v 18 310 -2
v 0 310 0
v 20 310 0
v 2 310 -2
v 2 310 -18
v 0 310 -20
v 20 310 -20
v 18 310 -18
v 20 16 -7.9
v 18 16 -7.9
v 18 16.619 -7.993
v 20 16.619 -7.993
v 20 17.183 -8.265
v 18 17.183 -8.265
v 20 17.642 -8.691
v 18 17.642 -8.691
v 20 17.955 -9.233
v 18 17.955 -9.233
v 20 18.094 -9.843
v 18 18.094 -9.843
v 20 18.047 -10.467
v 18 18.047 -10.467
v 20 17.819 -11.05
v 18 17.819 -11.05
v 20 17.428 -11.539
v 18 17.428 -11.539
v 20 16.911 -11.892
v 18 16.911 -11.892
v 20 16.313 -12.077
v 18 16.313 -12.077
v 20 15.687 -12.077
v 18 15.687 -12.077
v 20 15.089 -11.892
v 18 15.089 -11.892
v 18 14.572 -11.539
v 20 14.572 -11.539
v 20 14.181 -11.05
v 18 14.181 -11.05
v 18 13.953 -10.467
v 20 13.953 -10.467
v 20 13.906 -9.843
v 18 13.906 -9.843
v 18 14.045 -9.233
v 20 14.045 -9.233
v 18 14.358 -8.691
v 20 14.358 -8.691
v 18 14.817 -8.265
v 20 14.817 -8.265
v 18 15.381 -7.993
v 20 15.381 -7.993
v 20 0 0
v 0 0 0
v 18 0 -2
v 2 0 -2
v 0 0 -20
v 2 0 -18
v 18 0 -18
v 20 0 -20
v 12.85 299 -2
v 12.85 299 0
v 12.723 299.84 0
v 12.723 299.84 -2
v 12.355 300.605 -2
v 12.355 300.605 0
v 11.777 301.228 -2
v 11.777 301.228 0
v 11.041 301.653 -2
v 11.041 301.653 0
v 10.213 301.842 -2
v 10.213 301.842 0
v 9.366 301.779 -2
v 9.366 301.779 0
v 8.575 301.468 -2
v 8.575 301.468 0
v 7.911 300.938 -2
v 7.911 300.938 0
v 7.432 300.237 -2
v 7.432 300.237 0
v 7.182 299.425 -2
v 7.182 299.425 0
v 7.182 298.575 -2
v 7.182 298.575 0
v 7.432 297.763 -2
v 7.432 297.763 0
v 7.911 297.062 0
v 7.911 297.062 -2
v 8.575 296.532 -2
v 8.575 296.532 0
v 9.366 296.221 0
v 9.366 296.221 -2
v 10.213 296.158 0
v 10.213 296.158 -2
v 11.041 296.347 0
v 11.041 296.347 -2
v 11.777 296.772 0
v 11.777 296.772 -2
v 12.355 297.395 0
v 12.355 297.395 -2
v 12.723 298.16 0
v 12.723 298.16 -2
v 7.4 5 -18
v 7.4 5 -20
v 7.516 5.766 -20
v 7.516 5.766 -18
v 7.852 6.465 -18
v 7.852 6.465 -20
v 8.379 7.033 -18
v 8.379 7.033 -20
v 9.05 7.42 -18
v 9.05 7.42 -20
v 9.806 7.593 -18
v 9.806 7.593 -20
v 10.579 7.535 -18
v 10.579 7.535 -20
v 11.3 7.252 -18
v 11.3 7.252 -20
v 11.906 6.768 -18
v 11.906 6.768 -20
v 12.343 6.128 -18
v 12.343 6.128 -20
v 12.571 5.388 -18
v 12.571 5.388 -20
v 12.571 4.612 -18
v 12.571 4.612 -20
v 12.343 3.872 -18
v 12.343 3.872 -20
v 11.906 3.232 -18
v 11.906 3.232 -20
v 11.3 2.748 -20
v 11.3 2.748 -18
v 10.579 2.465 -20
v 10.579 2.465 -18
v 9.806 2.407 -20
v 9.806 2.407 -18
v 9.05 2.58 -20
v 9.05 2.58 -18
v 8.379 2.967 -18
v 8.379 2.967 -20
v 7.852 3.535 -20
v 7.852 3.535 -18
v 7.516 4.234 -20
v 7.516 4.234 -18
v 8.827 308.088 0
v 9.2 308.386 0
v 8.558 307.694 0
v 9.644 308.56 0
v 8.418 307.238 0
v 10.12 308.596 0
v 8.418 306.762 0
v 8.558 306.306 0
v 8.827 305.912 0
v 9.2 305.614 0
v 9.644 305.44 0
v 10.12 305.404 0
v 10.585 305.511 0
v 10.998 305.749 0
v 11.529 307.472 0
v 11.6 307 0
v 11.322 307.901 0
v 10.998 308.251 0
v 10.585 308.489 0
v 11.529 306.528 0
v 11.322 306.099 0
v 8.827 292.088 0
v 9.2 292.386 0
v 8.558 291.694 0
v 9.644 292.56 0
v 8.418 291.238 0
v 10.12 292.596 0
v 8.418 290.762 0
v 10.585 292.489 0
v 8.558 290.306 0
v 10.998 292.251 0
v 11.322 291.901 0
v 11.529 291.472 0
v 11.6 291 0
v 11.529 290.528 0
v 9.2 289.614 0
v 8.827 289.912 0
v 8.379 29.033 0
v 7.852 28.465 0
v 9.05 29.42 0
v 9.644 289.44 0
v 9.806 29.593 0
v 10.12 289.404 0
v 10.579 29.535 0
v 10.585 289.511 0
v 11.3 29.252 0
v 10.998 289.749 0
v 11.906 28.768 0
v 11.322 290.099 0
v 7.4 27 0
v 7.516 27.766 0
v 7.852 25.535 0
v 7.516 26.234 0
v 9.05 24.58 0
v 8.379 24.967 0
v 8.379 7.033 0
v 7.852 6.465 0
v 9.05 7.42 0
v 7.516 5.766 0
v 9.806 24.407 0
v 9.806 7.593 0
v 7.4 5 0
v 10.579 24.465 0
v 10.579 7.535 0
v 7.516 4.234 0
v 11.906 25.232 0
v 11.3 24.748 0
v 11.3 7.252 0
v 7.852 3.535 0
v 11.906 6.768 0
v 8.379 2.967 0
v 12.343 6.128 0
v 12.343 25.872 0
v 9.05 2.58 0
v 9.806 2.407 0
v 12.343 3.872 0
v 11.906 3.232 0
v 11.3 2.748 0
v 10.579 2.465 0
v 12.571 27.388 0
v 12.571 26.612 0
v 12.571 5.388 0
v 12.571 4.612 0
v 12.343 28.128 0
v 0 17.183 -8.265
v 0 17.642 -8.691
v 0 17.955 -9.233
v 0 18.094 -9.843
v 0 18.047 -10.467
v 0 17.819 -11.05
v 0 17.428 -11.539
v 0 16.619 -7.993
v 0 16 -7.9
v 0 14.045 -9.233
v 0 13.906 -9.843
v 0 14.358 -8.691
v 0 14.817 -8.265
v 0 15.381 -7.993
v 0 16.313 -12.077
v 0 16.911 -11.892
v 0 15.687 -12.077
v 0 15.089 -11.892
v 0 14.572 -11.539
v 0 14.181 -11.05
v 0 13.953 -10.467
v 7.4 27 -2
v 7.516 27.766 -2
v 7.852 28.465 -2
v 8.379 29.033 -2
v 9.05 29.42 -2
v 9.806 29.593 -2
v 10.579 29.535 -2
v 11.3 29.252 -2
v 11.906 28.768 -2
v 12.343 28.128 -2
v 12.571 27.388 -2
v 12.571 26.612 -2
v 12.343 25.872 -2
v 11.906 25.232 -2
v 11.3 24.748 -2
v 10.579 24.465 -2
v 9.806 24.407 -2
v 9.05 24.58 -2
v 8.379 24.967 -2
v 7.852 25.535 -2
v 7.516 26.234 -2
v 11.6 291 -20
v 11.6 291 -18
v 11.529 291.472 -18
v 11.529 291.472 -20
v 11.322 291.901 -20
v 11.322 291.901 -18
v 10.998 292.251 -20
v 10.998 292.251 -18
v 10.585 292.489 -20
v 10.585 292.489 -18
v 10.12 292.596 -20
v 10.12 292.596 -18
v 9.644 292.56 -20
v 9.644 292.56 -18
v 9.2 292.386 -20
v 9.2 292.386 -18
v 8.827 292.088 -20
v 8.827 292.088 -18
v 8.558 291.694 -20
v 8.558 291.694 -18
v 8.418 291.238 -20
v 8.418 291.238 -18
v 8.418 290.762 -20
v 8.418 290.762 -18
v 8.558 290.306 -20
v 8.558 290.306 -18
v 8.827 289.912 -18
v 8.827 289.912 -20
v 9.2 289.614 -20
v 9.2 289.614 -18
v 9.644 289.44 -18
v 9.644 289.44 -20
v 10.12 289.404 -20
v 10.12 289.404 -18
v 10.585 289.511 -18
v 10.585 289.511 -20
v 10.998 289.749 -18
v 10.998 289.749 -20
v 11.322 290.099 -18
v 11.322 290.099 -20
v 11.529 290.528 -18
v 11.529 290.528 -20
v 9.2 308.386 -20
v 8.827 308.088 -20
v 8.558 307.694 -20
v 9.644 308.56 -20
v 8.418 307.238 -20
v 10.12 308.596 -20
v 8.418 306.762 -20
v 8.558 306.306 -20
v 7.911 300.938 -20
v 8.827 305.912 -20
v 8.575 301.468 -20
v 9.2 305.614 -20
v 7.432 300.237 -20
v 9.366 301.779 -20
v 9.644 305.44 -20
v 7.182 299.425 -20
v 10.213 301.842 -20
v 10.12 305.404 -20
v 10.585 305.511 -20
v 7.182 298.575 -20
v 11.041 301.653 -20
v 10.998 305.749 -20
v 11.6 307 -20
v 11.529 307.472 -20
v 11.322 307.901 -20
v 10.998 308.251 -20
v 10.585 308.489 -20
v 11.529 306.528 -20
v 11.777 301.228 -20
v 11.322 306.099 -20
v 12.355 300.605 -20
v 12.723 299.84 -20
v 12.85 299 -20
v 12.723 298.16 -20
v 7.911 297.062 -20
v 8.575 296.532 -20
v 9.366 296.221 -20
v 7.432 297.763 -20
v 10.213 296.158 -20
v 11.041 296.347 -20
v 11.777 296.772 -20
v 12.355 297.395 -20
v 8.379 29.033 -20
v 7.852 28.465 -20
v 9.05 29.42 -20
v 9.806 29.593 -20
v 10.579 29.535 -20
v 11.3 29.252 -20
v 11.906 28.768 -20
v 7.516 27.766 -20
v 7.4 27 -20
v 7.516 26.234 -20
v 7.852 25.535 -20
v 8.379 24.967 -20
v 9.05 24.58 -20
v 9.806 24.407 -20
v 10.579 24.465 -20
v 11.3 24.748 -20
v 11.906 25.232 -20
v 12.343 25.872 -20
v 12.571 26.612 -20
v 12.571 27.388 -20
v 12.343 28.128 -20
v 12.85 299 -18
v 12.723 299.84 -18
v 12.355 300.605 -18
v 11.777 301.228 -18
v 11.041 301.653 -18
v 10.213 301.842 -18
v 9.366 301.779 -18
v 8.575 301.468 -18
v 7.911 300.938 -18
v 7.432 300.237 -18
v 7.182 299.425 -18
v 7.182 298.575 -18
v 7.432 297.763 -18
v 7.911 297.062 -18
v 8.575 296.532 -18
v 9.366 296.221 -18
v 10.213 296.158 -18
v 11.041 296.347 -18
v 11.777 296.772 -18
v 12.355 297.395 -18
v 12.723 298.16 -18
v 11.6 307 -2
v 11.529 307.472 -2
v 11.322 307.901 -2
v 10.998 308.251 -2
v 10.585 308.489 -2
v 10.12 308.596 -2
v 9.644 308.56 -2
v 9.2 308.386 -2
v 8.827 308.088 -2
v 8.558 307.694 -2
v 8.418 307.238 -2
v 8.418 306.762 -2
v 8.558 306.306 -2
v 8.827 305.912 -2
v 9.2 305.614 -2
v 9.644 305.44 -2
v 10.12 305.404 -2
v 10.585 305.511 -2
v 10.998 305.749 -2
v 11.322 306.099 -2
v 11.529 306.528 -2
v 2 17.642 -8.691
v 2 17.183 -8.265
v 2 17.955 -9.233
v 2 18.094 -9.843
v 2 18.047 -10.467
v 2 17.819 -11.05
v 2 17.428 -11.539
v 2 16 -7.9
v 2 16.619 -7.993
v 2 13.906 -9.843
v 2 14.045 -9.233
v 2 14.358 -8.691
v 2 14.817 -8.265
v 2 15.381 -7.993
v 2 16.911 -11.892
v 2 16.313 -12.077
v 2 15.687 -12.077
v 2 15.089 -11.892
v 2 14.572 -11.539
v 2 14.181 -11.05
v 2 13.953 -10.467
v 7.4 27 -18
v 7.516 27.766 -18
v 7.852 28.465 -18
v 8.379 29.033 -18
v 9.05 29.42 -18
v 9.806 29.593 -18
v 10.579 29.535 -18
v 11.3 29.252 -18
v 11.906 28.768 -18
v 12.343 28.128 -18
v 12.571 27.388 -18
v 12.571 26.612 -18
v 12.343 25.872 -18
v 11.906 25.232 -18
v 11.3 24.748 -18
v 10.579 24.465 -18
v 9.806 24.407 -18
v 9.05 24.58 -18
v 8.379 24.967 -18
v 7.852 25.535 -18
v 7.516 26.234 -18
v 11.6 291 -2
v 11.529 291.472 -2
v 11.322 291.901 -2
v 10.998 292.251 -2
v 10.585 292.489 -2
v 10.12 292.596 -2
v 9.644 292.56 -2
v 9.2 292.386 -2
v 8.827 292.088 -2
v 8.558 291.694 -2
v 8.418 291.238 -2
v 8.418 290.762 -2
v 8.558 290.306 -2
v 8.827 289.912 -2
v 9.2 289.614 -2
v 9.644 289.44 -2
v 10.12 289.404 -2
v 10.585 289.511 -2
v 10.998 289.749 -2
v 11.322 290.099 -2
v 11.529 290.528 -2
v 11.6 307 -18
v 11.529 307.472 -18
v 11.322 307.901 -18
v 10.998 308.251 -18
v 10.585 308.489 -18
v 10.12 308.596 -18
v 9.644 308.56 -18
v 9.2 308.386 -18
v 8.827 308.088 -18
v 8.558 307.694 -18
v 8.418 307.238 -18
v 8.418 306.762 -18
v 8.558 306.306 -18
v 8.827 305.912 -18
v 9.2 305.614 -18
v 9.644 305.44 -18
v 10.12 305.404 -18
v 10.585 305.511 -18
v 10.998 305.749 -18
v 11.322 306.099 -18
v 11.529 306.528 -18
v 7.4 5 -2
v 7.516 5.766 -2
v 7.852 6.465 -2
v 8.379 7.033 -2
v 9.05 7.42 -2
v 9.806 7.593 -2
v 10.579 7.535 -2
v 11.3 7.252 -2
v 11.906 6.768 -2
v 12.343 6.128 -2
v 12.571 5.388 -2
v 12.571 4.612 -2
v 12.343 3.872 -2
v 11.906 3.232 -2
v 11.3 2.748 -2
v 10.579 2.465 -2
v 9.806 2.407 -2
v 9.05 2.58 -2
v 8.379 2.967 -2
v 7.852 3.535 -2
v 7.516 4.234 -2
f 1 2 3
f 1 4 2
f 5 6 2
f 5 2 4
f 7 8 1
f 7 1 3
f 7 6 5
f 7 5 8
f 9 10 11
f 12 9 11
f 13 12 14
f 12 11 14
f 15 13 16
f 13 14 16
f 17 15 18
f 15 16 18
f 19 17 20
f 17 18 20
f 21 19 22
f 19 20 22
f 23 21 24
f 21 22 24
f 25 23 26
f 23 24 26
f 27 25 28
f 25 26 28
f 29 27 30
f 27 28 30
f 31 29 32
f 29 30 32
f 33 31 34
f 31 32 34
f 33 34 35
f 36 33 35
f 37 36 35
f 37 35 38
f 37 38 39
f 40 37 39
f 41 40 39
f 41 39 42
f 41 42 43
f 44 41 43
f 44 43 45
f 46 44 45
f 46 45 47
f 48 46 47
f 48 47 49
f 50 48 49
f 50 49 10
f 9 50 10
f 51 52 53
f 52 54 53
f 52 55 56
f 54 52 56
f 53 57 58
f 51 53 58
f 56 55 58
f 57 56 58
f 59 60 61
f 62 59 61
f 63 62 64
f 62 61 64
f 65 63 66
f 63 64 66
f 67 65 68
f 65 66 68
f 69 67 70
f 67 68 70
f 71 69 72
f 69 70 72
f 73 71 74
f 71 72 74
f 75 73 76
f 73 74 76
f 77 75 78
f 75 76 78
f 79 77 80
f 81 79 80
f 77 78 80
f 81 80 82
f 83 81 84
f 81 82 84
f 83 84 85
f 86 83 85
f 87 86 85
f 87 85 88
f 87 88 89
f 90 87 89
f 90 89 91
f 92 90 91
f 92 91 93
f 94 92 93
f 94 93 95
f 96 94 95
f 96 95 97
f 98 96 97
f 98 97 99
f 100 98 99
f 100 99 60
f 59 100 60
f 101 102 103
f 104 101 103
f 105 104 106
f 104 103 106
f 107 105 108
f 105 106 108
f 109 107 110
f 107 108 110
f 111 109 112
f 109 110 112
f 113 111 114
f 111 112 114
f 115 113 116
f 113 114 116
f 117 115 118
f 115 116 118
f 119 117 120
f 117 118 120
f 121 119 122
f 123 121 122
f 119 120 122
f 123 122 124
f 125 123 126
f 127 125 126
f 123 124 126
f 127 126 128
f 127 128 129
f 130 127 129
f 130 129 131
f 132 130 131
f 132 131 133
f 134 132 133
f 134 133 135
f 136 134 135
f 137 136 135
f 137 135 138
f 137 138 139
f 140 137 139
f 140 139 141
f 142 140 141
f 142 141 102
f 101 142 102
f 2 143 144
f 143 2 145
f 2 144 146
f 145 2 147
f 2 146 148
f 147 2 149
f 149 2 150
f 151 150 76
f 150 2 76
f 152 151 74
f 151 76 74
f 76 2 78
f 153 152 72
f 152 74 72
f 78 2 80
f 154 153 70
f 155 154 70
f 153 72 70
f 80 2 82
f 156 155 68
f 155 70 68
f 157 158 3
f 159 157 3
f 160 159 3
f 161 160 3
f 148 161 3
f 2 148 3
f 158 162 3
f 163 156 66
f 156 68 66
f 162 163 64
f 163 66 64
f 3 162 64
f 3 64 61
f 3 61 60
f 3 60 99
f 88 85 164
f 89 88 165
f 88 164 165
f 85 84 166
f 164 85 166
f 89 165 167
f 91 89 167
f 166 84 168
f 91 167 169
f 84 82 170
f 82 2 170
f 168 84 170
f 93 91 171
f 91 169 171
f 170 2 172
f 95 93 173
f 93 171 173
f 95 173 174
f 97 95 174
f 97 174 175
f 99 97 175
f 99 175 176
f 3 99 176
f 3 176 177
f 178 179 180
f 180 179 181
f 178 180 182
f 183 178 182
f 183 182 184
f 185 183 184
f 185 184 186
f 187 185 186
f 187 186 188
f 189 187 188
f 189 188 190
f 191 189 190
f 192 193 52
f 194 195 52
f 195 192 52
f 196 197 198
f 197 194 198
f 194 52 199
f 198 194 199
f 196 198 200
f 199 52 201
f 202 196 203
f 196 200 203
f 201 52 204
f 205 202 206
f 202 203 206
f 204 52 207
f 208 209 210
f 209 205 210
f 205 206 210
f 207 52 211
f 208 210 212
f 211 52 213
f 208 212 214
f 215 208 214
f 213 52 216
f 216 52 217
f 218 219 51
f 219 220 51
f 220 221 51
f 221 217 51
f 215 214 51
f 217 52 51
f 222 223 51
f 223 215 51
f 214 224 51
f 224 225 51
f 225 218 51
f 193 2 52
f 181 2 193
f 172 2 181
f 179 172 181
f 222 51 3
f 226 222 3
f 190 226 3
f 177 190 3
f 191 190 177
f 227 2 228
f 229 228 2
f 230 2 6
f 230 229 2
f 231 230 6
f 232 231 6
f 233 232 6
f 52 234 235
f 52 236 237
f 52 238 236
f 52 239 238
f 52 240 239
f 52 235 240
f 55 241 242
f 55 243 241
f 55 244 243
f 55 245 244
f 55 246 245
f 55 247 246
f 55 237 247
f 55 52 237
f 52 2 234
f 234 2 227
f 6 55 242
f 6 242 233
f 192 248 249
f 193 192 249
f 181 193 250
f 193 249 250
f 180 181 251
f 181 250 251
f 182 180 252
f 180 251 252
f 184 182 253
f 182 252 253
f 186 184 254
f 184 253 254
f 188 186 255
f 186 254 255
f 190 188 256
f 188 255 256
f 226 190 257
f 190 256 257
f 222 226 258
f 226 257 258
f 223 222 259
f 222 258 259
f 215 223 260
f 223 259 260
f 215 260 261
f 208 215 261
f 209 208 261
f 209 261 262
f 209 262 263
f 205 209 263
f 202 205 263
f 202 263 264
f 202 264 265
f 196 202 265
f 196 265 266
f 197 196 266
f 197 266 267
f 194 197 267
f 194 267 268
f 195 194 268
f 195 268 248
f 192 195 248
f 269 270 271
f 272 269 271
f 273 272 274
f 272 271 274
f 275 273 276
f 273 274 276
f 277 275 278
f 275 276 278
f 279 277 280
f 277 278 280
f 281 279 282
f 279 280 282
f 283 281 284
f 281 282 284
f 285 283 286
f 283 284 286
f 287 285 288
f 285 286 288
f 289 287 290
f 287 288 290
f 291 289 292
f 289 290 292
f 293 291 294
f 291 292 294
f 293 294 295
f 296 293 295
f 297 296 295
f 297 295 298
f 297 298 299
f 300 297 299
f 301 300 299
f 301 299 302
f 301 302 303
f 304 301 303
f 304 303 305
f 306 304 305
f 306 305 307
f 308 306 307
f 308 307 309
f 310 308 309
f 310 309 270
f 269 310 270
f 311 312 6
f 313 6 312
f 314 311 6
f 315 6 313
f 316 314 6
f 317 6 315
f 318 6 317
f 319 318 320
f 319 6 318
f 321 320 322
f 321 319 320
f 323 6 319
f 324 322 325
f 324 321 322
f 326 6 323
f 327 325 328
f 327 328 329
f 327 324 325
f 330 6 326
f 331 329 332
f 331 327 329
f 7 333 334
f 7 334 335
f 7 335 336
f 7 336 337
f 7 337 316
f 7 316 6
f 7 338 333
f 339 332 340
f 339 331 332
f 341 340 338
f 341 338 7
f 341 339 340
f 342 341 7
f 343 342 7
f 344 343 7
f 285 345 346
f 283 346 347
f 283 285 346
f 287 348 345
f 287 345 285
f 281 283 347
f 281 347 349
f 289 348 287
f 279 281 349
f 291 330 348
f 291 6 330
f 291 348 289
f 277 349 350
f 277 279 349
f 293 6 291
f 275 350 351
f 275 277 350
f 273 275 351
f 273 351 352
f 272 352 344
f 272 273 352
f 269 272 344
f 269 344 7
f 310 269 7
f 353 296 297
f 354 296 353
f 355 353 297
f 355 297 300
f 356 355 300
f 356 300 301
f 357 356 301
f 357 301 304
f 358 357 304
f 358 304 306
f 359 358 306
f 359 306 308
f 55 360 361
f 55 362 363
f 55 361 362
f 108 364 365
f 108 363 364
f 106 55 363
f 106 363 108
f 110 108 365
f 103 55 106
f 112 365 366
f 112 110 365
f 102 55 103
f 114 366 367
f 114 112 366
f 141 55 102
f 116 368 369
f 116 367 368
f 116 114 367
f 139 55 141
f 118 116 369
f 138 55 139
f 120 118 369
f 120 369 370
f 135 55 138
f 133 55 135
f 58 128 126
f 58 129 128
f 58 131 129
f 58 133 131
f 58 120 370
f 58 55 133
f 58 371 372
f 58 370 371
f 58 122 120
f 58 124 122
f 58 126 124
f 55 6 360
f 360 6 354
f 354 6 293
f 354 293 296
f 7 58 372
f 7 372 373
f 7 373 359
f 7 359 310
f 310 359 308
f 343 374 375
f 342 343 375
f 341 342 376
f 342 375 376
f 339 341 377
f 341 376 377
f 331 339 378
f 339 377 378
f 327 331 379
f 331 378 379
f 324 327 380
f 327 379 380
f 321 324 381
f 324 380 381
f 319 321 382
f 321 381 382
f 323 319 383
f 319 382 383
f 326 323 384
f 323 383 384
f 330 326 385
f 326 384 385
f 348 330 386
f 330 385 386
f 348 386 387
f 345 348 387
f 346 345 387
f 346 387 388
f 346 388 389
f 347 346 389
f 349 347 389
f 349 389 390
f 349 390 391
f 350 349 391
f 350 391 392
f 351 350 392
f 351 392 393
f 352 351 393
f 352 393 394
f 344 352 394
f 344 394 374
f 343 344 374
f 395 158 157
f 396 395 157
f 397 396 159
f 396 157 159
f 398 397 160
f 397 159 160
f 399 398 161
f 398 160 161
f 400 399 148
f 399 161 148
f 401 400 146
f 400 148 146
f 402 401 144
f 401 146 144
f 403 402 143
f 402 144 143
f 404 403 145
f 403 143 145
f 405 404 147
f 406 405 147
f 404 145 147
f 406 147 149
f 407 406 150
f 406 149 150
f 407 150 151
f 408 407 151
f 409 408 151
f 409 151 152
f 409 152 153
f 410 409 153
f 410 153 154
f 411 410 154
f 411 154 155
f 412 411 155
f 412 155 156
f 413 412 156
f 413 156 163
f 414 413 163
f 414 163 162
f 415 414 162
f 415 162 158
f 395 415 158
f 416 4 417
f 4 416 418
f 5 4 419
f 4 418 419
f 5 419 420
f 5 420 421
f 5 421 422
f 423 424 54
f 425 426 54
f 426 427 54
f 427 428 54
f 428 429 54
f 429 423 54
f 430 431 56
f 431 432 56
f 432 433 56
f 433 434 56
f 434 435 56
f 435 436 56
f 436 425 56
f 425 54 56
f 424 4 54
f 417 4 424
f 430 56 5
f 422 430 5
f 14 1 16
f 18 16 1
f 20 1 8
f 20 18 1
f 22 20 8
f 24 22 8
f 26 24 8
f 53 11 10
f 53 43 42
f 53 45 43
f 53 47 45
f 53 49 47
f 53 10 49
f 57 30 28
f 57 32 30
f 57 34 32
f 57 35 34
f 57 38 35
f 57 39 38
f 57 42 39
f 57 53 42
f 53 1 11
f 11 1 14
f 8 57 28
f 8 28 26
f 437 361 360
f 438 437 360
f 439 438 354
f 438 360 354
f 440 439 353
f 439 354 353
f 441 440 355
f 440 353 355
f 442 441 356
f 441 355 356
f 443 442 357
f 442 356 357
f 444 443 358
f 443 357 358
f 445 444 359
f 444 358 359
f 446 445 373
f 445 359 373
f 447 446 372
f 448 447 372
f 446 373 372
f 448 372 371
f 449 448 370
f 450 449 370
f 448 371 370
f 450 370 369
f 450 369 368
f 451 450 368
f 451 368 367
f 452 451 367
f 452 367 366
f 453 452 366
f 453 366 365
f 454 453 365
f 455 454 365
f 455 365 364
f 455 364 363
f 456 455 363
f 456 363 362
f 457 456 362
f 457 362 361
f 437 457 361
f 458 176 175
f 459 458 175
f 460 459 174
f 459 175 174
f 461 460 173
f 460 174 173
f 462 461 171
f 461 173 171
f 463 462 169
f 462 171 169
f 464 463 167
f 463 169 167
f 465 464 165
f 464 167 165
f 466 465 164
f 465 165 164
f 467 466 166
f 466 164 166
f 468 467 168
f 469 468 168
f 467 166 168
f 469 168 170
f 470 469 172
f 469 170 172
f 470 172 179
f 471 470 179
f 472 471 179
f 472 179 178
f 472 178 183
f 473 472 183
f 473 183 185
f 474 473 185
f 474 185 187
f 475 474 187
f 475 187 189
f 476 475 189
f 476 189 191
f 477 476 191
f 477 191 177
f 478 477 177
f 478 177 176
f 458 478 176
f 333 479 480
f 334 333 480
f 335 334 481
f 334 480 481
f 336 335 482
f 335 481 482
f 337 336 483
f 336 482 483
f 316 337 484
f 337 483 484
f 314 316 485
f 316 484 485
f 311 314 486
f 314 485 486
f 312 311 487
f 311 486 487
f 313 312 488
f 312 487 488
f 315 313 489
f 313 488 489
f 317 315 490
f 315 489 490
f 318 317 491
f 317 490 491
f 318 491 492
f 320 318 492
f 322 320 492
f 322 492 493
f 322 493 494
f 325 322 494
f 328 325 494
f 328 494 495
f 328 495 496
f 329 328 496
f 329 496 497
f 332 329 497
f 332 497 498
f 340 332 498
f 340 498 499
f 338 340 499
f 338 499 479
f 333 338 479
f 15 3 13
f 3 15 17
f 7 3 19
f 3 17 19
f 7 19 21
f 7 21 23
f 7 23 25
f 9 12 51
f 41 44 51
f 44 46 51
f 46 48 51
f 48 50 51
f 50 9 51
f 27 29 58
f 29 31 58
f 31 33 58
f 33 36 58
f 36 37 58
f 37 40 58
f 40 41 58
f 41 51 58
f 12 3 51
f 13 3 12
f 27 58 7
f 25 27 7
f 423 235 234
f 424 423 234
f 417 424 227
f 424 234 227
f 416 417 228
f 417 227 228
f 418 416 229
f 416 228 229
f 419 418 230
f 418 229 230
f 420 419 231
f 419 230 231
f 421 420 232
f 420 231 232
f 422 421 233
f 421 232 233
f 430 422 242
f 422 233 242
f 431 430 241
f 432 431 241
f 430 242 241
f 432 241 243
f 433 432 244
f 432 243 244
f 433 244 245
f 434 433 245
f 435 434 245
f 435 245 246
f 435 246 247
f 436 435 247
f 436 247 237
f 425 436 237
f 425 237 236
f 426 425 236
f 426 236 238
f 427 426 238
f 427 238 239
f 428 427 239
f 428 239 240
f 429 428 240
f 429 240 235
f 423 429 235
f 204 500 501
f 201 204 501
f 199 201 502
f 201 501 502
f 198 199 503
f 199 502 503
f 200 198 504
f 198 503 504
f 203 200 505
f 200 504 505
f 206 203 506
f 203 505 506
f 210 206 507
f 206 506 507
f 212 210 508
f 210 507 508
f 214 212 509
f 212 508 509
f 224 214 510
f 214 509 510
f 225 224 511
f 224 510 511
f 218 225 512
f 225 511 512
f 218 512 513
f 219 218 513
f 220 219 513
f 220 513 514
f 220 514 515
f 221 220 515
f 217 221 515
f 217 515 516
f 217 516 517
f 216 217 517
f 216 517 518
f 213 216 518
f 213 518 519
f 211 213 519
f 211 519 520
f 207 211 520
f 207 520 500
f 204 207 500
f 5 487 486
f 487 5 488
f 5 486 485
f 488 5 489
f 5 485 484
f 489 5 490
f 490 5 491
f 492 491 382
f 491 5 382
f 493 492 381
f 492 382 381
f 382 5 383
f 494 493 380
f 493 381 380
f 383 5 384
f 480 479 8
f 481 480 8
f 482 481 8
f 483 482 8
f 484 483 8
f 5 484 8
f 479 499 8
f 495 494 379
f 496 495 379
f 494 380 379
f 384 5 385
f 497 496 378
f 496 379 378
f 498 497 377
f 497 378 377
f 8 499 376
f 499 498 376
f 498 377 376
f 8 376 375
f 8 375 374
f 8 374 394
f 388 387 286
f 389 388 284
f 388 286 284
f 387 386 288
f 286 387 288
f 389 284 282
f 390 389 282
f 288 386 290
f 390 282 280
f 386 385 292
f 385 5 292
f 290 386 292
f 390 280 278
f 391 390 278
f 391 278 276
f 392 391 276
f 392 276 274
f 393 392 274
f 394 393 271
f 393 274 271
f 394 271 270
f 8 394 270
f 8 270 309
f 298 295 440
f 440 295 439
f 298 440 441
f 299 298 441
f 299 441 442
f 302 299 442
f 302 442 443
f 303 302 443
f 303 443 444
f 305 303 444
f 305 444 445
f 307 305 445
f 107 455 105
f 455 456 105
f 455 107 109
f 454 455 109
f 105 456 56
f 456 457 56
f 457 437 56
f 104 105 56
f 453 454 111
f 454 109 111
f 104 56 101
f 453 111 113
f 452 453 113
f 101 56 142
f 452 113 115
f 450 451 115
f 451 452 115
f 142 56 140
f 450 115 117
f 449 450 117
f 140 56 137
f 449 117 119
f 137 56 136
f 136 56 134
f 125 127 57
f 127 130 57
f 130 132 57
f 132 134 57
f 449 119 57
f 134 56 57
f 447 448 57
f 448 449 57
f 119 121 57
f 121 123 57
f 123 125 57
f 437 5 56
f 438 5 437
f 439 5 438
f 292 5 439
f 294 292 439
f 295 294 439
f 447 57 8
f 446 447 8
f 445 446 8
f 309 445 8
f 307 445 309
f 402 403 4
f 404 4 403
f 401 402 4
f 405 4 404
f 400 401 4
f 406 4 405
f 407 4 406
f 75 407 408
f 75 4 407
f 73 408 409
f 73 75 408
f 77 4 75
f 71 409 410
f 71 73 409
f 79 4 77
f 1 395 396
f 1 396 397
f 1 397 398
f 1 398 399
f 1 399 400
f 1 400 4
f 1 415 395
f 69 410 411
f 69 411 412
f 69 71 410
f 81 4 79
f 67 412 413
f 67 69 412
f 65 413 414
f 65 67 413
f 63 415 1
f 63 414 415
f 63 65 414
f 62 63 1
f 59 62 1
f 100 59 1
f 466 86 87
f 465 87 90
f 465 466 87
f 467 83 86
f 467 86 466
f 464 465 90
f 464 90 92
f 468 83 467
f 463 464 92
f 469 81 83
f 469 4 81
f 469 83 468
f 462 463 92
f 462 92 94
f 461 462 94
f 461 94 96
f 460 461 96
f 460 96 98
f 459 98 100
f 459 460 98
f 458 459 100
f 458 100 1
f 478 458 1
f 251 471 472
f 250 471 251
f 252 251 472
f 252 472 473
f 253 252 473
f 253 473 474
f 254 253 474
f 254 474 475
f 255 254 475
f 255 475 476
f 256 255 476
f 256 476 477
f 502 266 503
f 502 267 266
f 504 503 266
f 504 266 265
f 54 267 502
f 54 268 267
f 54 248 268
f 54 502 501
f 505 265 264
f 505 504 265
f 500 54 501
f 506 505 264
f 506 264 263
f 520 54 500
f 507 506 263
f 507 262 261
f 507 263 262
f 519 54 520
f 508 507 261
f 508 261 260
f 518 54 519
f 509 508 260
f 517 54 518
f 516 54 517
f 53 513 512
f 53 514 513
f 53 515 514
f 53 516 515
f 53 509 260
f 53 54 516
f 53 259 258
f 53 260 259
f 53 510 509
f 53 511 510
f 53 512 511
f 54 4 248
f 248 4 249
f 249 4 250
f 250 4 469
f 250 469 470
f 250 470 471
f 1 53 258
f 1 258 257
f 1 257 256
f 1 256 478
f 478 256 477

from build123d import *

# Parameters (mm, degrees)
ESBO_O1_W             = 20
ESBO_O1_H             = 20
ESBO_O1_W_2           = 16
ESBO_O1_H_2           = 16
EXTRUS_O_FINA1_DEPTH  = 310
ESBO_O4_R             = 2.85
ESBO_O4_R_2           = 1.6
CORTE_EXTRUS_O2_DEPTH = 21
ESBO_O5_R             = 2.6
CORTE_EXTRUS_O5_DEPTH = 21
ESBO_O6_R             = 2.1
CORTE_EXTRUS_O6_DEPTH = 21


with BuildPart() as part:
    # Esboço1 → Extrusão-Fina1 (new body)
    with BuildSketch(Plane(origin=(0, 0, 0), x_dir=(1, 0, 0), z_dir=(0, 1, 0))):
        with Locations((10, 10)):
            Rectangle(ESBO_O1_W, ESBO_O1_H)
        with Locations((10, 10)):
            Rectangle(ESBO_O1_W_2, ESBO_O1_H_2, mode=Mode.SUBTRACT)
    extrude(amount=EXTRUS_O_FINA1_DEPTH)

    # Esboço4 → Corte-extrusão2 (cut, through all)
    with BuildSketch(Plane.XY):
        with Locations((10, 299)):
            Circle(ESBO_O4_R)
        with Locations((10, 291)):
            Circle(ESBO_O4_R_2)
        with Locations((10, 307)):
            Circle(ESBO_O4_R_2)
    extrude(amount=-CORTE_EXTRUS_O2_DEPTH, mode=Mode.SUBTRACT)

    # Esboço5 → Corte-extrusão5 (cut, through all)
    with BuildSketch(Plane(origin=(0, 0, -20), x_dir=(-1, 0, 0), z_dir=(0, 0, -1))):
        with Locations((-10, 5)):
            Circle(ESBO_O5_R)
        with Locations((-10, 27)):
            Circle(ESBO_O5_R)
    extrude(amount=-CORTE_EXTRUS_O5_DEPTH, mode=Mode.SUBTRACT)

    # Esboço6 → Corte-extrusão6 (cut, through all)
    with BuildSketch(Plane.ZY):
        with Locations((-10, 16)):
            Circle(ESBO_O6_R)
    extrude(amount=-CORTE_EXTRUS_O6_DEPTH, mode=Mode.SUBTRACT)


solid = part.part
